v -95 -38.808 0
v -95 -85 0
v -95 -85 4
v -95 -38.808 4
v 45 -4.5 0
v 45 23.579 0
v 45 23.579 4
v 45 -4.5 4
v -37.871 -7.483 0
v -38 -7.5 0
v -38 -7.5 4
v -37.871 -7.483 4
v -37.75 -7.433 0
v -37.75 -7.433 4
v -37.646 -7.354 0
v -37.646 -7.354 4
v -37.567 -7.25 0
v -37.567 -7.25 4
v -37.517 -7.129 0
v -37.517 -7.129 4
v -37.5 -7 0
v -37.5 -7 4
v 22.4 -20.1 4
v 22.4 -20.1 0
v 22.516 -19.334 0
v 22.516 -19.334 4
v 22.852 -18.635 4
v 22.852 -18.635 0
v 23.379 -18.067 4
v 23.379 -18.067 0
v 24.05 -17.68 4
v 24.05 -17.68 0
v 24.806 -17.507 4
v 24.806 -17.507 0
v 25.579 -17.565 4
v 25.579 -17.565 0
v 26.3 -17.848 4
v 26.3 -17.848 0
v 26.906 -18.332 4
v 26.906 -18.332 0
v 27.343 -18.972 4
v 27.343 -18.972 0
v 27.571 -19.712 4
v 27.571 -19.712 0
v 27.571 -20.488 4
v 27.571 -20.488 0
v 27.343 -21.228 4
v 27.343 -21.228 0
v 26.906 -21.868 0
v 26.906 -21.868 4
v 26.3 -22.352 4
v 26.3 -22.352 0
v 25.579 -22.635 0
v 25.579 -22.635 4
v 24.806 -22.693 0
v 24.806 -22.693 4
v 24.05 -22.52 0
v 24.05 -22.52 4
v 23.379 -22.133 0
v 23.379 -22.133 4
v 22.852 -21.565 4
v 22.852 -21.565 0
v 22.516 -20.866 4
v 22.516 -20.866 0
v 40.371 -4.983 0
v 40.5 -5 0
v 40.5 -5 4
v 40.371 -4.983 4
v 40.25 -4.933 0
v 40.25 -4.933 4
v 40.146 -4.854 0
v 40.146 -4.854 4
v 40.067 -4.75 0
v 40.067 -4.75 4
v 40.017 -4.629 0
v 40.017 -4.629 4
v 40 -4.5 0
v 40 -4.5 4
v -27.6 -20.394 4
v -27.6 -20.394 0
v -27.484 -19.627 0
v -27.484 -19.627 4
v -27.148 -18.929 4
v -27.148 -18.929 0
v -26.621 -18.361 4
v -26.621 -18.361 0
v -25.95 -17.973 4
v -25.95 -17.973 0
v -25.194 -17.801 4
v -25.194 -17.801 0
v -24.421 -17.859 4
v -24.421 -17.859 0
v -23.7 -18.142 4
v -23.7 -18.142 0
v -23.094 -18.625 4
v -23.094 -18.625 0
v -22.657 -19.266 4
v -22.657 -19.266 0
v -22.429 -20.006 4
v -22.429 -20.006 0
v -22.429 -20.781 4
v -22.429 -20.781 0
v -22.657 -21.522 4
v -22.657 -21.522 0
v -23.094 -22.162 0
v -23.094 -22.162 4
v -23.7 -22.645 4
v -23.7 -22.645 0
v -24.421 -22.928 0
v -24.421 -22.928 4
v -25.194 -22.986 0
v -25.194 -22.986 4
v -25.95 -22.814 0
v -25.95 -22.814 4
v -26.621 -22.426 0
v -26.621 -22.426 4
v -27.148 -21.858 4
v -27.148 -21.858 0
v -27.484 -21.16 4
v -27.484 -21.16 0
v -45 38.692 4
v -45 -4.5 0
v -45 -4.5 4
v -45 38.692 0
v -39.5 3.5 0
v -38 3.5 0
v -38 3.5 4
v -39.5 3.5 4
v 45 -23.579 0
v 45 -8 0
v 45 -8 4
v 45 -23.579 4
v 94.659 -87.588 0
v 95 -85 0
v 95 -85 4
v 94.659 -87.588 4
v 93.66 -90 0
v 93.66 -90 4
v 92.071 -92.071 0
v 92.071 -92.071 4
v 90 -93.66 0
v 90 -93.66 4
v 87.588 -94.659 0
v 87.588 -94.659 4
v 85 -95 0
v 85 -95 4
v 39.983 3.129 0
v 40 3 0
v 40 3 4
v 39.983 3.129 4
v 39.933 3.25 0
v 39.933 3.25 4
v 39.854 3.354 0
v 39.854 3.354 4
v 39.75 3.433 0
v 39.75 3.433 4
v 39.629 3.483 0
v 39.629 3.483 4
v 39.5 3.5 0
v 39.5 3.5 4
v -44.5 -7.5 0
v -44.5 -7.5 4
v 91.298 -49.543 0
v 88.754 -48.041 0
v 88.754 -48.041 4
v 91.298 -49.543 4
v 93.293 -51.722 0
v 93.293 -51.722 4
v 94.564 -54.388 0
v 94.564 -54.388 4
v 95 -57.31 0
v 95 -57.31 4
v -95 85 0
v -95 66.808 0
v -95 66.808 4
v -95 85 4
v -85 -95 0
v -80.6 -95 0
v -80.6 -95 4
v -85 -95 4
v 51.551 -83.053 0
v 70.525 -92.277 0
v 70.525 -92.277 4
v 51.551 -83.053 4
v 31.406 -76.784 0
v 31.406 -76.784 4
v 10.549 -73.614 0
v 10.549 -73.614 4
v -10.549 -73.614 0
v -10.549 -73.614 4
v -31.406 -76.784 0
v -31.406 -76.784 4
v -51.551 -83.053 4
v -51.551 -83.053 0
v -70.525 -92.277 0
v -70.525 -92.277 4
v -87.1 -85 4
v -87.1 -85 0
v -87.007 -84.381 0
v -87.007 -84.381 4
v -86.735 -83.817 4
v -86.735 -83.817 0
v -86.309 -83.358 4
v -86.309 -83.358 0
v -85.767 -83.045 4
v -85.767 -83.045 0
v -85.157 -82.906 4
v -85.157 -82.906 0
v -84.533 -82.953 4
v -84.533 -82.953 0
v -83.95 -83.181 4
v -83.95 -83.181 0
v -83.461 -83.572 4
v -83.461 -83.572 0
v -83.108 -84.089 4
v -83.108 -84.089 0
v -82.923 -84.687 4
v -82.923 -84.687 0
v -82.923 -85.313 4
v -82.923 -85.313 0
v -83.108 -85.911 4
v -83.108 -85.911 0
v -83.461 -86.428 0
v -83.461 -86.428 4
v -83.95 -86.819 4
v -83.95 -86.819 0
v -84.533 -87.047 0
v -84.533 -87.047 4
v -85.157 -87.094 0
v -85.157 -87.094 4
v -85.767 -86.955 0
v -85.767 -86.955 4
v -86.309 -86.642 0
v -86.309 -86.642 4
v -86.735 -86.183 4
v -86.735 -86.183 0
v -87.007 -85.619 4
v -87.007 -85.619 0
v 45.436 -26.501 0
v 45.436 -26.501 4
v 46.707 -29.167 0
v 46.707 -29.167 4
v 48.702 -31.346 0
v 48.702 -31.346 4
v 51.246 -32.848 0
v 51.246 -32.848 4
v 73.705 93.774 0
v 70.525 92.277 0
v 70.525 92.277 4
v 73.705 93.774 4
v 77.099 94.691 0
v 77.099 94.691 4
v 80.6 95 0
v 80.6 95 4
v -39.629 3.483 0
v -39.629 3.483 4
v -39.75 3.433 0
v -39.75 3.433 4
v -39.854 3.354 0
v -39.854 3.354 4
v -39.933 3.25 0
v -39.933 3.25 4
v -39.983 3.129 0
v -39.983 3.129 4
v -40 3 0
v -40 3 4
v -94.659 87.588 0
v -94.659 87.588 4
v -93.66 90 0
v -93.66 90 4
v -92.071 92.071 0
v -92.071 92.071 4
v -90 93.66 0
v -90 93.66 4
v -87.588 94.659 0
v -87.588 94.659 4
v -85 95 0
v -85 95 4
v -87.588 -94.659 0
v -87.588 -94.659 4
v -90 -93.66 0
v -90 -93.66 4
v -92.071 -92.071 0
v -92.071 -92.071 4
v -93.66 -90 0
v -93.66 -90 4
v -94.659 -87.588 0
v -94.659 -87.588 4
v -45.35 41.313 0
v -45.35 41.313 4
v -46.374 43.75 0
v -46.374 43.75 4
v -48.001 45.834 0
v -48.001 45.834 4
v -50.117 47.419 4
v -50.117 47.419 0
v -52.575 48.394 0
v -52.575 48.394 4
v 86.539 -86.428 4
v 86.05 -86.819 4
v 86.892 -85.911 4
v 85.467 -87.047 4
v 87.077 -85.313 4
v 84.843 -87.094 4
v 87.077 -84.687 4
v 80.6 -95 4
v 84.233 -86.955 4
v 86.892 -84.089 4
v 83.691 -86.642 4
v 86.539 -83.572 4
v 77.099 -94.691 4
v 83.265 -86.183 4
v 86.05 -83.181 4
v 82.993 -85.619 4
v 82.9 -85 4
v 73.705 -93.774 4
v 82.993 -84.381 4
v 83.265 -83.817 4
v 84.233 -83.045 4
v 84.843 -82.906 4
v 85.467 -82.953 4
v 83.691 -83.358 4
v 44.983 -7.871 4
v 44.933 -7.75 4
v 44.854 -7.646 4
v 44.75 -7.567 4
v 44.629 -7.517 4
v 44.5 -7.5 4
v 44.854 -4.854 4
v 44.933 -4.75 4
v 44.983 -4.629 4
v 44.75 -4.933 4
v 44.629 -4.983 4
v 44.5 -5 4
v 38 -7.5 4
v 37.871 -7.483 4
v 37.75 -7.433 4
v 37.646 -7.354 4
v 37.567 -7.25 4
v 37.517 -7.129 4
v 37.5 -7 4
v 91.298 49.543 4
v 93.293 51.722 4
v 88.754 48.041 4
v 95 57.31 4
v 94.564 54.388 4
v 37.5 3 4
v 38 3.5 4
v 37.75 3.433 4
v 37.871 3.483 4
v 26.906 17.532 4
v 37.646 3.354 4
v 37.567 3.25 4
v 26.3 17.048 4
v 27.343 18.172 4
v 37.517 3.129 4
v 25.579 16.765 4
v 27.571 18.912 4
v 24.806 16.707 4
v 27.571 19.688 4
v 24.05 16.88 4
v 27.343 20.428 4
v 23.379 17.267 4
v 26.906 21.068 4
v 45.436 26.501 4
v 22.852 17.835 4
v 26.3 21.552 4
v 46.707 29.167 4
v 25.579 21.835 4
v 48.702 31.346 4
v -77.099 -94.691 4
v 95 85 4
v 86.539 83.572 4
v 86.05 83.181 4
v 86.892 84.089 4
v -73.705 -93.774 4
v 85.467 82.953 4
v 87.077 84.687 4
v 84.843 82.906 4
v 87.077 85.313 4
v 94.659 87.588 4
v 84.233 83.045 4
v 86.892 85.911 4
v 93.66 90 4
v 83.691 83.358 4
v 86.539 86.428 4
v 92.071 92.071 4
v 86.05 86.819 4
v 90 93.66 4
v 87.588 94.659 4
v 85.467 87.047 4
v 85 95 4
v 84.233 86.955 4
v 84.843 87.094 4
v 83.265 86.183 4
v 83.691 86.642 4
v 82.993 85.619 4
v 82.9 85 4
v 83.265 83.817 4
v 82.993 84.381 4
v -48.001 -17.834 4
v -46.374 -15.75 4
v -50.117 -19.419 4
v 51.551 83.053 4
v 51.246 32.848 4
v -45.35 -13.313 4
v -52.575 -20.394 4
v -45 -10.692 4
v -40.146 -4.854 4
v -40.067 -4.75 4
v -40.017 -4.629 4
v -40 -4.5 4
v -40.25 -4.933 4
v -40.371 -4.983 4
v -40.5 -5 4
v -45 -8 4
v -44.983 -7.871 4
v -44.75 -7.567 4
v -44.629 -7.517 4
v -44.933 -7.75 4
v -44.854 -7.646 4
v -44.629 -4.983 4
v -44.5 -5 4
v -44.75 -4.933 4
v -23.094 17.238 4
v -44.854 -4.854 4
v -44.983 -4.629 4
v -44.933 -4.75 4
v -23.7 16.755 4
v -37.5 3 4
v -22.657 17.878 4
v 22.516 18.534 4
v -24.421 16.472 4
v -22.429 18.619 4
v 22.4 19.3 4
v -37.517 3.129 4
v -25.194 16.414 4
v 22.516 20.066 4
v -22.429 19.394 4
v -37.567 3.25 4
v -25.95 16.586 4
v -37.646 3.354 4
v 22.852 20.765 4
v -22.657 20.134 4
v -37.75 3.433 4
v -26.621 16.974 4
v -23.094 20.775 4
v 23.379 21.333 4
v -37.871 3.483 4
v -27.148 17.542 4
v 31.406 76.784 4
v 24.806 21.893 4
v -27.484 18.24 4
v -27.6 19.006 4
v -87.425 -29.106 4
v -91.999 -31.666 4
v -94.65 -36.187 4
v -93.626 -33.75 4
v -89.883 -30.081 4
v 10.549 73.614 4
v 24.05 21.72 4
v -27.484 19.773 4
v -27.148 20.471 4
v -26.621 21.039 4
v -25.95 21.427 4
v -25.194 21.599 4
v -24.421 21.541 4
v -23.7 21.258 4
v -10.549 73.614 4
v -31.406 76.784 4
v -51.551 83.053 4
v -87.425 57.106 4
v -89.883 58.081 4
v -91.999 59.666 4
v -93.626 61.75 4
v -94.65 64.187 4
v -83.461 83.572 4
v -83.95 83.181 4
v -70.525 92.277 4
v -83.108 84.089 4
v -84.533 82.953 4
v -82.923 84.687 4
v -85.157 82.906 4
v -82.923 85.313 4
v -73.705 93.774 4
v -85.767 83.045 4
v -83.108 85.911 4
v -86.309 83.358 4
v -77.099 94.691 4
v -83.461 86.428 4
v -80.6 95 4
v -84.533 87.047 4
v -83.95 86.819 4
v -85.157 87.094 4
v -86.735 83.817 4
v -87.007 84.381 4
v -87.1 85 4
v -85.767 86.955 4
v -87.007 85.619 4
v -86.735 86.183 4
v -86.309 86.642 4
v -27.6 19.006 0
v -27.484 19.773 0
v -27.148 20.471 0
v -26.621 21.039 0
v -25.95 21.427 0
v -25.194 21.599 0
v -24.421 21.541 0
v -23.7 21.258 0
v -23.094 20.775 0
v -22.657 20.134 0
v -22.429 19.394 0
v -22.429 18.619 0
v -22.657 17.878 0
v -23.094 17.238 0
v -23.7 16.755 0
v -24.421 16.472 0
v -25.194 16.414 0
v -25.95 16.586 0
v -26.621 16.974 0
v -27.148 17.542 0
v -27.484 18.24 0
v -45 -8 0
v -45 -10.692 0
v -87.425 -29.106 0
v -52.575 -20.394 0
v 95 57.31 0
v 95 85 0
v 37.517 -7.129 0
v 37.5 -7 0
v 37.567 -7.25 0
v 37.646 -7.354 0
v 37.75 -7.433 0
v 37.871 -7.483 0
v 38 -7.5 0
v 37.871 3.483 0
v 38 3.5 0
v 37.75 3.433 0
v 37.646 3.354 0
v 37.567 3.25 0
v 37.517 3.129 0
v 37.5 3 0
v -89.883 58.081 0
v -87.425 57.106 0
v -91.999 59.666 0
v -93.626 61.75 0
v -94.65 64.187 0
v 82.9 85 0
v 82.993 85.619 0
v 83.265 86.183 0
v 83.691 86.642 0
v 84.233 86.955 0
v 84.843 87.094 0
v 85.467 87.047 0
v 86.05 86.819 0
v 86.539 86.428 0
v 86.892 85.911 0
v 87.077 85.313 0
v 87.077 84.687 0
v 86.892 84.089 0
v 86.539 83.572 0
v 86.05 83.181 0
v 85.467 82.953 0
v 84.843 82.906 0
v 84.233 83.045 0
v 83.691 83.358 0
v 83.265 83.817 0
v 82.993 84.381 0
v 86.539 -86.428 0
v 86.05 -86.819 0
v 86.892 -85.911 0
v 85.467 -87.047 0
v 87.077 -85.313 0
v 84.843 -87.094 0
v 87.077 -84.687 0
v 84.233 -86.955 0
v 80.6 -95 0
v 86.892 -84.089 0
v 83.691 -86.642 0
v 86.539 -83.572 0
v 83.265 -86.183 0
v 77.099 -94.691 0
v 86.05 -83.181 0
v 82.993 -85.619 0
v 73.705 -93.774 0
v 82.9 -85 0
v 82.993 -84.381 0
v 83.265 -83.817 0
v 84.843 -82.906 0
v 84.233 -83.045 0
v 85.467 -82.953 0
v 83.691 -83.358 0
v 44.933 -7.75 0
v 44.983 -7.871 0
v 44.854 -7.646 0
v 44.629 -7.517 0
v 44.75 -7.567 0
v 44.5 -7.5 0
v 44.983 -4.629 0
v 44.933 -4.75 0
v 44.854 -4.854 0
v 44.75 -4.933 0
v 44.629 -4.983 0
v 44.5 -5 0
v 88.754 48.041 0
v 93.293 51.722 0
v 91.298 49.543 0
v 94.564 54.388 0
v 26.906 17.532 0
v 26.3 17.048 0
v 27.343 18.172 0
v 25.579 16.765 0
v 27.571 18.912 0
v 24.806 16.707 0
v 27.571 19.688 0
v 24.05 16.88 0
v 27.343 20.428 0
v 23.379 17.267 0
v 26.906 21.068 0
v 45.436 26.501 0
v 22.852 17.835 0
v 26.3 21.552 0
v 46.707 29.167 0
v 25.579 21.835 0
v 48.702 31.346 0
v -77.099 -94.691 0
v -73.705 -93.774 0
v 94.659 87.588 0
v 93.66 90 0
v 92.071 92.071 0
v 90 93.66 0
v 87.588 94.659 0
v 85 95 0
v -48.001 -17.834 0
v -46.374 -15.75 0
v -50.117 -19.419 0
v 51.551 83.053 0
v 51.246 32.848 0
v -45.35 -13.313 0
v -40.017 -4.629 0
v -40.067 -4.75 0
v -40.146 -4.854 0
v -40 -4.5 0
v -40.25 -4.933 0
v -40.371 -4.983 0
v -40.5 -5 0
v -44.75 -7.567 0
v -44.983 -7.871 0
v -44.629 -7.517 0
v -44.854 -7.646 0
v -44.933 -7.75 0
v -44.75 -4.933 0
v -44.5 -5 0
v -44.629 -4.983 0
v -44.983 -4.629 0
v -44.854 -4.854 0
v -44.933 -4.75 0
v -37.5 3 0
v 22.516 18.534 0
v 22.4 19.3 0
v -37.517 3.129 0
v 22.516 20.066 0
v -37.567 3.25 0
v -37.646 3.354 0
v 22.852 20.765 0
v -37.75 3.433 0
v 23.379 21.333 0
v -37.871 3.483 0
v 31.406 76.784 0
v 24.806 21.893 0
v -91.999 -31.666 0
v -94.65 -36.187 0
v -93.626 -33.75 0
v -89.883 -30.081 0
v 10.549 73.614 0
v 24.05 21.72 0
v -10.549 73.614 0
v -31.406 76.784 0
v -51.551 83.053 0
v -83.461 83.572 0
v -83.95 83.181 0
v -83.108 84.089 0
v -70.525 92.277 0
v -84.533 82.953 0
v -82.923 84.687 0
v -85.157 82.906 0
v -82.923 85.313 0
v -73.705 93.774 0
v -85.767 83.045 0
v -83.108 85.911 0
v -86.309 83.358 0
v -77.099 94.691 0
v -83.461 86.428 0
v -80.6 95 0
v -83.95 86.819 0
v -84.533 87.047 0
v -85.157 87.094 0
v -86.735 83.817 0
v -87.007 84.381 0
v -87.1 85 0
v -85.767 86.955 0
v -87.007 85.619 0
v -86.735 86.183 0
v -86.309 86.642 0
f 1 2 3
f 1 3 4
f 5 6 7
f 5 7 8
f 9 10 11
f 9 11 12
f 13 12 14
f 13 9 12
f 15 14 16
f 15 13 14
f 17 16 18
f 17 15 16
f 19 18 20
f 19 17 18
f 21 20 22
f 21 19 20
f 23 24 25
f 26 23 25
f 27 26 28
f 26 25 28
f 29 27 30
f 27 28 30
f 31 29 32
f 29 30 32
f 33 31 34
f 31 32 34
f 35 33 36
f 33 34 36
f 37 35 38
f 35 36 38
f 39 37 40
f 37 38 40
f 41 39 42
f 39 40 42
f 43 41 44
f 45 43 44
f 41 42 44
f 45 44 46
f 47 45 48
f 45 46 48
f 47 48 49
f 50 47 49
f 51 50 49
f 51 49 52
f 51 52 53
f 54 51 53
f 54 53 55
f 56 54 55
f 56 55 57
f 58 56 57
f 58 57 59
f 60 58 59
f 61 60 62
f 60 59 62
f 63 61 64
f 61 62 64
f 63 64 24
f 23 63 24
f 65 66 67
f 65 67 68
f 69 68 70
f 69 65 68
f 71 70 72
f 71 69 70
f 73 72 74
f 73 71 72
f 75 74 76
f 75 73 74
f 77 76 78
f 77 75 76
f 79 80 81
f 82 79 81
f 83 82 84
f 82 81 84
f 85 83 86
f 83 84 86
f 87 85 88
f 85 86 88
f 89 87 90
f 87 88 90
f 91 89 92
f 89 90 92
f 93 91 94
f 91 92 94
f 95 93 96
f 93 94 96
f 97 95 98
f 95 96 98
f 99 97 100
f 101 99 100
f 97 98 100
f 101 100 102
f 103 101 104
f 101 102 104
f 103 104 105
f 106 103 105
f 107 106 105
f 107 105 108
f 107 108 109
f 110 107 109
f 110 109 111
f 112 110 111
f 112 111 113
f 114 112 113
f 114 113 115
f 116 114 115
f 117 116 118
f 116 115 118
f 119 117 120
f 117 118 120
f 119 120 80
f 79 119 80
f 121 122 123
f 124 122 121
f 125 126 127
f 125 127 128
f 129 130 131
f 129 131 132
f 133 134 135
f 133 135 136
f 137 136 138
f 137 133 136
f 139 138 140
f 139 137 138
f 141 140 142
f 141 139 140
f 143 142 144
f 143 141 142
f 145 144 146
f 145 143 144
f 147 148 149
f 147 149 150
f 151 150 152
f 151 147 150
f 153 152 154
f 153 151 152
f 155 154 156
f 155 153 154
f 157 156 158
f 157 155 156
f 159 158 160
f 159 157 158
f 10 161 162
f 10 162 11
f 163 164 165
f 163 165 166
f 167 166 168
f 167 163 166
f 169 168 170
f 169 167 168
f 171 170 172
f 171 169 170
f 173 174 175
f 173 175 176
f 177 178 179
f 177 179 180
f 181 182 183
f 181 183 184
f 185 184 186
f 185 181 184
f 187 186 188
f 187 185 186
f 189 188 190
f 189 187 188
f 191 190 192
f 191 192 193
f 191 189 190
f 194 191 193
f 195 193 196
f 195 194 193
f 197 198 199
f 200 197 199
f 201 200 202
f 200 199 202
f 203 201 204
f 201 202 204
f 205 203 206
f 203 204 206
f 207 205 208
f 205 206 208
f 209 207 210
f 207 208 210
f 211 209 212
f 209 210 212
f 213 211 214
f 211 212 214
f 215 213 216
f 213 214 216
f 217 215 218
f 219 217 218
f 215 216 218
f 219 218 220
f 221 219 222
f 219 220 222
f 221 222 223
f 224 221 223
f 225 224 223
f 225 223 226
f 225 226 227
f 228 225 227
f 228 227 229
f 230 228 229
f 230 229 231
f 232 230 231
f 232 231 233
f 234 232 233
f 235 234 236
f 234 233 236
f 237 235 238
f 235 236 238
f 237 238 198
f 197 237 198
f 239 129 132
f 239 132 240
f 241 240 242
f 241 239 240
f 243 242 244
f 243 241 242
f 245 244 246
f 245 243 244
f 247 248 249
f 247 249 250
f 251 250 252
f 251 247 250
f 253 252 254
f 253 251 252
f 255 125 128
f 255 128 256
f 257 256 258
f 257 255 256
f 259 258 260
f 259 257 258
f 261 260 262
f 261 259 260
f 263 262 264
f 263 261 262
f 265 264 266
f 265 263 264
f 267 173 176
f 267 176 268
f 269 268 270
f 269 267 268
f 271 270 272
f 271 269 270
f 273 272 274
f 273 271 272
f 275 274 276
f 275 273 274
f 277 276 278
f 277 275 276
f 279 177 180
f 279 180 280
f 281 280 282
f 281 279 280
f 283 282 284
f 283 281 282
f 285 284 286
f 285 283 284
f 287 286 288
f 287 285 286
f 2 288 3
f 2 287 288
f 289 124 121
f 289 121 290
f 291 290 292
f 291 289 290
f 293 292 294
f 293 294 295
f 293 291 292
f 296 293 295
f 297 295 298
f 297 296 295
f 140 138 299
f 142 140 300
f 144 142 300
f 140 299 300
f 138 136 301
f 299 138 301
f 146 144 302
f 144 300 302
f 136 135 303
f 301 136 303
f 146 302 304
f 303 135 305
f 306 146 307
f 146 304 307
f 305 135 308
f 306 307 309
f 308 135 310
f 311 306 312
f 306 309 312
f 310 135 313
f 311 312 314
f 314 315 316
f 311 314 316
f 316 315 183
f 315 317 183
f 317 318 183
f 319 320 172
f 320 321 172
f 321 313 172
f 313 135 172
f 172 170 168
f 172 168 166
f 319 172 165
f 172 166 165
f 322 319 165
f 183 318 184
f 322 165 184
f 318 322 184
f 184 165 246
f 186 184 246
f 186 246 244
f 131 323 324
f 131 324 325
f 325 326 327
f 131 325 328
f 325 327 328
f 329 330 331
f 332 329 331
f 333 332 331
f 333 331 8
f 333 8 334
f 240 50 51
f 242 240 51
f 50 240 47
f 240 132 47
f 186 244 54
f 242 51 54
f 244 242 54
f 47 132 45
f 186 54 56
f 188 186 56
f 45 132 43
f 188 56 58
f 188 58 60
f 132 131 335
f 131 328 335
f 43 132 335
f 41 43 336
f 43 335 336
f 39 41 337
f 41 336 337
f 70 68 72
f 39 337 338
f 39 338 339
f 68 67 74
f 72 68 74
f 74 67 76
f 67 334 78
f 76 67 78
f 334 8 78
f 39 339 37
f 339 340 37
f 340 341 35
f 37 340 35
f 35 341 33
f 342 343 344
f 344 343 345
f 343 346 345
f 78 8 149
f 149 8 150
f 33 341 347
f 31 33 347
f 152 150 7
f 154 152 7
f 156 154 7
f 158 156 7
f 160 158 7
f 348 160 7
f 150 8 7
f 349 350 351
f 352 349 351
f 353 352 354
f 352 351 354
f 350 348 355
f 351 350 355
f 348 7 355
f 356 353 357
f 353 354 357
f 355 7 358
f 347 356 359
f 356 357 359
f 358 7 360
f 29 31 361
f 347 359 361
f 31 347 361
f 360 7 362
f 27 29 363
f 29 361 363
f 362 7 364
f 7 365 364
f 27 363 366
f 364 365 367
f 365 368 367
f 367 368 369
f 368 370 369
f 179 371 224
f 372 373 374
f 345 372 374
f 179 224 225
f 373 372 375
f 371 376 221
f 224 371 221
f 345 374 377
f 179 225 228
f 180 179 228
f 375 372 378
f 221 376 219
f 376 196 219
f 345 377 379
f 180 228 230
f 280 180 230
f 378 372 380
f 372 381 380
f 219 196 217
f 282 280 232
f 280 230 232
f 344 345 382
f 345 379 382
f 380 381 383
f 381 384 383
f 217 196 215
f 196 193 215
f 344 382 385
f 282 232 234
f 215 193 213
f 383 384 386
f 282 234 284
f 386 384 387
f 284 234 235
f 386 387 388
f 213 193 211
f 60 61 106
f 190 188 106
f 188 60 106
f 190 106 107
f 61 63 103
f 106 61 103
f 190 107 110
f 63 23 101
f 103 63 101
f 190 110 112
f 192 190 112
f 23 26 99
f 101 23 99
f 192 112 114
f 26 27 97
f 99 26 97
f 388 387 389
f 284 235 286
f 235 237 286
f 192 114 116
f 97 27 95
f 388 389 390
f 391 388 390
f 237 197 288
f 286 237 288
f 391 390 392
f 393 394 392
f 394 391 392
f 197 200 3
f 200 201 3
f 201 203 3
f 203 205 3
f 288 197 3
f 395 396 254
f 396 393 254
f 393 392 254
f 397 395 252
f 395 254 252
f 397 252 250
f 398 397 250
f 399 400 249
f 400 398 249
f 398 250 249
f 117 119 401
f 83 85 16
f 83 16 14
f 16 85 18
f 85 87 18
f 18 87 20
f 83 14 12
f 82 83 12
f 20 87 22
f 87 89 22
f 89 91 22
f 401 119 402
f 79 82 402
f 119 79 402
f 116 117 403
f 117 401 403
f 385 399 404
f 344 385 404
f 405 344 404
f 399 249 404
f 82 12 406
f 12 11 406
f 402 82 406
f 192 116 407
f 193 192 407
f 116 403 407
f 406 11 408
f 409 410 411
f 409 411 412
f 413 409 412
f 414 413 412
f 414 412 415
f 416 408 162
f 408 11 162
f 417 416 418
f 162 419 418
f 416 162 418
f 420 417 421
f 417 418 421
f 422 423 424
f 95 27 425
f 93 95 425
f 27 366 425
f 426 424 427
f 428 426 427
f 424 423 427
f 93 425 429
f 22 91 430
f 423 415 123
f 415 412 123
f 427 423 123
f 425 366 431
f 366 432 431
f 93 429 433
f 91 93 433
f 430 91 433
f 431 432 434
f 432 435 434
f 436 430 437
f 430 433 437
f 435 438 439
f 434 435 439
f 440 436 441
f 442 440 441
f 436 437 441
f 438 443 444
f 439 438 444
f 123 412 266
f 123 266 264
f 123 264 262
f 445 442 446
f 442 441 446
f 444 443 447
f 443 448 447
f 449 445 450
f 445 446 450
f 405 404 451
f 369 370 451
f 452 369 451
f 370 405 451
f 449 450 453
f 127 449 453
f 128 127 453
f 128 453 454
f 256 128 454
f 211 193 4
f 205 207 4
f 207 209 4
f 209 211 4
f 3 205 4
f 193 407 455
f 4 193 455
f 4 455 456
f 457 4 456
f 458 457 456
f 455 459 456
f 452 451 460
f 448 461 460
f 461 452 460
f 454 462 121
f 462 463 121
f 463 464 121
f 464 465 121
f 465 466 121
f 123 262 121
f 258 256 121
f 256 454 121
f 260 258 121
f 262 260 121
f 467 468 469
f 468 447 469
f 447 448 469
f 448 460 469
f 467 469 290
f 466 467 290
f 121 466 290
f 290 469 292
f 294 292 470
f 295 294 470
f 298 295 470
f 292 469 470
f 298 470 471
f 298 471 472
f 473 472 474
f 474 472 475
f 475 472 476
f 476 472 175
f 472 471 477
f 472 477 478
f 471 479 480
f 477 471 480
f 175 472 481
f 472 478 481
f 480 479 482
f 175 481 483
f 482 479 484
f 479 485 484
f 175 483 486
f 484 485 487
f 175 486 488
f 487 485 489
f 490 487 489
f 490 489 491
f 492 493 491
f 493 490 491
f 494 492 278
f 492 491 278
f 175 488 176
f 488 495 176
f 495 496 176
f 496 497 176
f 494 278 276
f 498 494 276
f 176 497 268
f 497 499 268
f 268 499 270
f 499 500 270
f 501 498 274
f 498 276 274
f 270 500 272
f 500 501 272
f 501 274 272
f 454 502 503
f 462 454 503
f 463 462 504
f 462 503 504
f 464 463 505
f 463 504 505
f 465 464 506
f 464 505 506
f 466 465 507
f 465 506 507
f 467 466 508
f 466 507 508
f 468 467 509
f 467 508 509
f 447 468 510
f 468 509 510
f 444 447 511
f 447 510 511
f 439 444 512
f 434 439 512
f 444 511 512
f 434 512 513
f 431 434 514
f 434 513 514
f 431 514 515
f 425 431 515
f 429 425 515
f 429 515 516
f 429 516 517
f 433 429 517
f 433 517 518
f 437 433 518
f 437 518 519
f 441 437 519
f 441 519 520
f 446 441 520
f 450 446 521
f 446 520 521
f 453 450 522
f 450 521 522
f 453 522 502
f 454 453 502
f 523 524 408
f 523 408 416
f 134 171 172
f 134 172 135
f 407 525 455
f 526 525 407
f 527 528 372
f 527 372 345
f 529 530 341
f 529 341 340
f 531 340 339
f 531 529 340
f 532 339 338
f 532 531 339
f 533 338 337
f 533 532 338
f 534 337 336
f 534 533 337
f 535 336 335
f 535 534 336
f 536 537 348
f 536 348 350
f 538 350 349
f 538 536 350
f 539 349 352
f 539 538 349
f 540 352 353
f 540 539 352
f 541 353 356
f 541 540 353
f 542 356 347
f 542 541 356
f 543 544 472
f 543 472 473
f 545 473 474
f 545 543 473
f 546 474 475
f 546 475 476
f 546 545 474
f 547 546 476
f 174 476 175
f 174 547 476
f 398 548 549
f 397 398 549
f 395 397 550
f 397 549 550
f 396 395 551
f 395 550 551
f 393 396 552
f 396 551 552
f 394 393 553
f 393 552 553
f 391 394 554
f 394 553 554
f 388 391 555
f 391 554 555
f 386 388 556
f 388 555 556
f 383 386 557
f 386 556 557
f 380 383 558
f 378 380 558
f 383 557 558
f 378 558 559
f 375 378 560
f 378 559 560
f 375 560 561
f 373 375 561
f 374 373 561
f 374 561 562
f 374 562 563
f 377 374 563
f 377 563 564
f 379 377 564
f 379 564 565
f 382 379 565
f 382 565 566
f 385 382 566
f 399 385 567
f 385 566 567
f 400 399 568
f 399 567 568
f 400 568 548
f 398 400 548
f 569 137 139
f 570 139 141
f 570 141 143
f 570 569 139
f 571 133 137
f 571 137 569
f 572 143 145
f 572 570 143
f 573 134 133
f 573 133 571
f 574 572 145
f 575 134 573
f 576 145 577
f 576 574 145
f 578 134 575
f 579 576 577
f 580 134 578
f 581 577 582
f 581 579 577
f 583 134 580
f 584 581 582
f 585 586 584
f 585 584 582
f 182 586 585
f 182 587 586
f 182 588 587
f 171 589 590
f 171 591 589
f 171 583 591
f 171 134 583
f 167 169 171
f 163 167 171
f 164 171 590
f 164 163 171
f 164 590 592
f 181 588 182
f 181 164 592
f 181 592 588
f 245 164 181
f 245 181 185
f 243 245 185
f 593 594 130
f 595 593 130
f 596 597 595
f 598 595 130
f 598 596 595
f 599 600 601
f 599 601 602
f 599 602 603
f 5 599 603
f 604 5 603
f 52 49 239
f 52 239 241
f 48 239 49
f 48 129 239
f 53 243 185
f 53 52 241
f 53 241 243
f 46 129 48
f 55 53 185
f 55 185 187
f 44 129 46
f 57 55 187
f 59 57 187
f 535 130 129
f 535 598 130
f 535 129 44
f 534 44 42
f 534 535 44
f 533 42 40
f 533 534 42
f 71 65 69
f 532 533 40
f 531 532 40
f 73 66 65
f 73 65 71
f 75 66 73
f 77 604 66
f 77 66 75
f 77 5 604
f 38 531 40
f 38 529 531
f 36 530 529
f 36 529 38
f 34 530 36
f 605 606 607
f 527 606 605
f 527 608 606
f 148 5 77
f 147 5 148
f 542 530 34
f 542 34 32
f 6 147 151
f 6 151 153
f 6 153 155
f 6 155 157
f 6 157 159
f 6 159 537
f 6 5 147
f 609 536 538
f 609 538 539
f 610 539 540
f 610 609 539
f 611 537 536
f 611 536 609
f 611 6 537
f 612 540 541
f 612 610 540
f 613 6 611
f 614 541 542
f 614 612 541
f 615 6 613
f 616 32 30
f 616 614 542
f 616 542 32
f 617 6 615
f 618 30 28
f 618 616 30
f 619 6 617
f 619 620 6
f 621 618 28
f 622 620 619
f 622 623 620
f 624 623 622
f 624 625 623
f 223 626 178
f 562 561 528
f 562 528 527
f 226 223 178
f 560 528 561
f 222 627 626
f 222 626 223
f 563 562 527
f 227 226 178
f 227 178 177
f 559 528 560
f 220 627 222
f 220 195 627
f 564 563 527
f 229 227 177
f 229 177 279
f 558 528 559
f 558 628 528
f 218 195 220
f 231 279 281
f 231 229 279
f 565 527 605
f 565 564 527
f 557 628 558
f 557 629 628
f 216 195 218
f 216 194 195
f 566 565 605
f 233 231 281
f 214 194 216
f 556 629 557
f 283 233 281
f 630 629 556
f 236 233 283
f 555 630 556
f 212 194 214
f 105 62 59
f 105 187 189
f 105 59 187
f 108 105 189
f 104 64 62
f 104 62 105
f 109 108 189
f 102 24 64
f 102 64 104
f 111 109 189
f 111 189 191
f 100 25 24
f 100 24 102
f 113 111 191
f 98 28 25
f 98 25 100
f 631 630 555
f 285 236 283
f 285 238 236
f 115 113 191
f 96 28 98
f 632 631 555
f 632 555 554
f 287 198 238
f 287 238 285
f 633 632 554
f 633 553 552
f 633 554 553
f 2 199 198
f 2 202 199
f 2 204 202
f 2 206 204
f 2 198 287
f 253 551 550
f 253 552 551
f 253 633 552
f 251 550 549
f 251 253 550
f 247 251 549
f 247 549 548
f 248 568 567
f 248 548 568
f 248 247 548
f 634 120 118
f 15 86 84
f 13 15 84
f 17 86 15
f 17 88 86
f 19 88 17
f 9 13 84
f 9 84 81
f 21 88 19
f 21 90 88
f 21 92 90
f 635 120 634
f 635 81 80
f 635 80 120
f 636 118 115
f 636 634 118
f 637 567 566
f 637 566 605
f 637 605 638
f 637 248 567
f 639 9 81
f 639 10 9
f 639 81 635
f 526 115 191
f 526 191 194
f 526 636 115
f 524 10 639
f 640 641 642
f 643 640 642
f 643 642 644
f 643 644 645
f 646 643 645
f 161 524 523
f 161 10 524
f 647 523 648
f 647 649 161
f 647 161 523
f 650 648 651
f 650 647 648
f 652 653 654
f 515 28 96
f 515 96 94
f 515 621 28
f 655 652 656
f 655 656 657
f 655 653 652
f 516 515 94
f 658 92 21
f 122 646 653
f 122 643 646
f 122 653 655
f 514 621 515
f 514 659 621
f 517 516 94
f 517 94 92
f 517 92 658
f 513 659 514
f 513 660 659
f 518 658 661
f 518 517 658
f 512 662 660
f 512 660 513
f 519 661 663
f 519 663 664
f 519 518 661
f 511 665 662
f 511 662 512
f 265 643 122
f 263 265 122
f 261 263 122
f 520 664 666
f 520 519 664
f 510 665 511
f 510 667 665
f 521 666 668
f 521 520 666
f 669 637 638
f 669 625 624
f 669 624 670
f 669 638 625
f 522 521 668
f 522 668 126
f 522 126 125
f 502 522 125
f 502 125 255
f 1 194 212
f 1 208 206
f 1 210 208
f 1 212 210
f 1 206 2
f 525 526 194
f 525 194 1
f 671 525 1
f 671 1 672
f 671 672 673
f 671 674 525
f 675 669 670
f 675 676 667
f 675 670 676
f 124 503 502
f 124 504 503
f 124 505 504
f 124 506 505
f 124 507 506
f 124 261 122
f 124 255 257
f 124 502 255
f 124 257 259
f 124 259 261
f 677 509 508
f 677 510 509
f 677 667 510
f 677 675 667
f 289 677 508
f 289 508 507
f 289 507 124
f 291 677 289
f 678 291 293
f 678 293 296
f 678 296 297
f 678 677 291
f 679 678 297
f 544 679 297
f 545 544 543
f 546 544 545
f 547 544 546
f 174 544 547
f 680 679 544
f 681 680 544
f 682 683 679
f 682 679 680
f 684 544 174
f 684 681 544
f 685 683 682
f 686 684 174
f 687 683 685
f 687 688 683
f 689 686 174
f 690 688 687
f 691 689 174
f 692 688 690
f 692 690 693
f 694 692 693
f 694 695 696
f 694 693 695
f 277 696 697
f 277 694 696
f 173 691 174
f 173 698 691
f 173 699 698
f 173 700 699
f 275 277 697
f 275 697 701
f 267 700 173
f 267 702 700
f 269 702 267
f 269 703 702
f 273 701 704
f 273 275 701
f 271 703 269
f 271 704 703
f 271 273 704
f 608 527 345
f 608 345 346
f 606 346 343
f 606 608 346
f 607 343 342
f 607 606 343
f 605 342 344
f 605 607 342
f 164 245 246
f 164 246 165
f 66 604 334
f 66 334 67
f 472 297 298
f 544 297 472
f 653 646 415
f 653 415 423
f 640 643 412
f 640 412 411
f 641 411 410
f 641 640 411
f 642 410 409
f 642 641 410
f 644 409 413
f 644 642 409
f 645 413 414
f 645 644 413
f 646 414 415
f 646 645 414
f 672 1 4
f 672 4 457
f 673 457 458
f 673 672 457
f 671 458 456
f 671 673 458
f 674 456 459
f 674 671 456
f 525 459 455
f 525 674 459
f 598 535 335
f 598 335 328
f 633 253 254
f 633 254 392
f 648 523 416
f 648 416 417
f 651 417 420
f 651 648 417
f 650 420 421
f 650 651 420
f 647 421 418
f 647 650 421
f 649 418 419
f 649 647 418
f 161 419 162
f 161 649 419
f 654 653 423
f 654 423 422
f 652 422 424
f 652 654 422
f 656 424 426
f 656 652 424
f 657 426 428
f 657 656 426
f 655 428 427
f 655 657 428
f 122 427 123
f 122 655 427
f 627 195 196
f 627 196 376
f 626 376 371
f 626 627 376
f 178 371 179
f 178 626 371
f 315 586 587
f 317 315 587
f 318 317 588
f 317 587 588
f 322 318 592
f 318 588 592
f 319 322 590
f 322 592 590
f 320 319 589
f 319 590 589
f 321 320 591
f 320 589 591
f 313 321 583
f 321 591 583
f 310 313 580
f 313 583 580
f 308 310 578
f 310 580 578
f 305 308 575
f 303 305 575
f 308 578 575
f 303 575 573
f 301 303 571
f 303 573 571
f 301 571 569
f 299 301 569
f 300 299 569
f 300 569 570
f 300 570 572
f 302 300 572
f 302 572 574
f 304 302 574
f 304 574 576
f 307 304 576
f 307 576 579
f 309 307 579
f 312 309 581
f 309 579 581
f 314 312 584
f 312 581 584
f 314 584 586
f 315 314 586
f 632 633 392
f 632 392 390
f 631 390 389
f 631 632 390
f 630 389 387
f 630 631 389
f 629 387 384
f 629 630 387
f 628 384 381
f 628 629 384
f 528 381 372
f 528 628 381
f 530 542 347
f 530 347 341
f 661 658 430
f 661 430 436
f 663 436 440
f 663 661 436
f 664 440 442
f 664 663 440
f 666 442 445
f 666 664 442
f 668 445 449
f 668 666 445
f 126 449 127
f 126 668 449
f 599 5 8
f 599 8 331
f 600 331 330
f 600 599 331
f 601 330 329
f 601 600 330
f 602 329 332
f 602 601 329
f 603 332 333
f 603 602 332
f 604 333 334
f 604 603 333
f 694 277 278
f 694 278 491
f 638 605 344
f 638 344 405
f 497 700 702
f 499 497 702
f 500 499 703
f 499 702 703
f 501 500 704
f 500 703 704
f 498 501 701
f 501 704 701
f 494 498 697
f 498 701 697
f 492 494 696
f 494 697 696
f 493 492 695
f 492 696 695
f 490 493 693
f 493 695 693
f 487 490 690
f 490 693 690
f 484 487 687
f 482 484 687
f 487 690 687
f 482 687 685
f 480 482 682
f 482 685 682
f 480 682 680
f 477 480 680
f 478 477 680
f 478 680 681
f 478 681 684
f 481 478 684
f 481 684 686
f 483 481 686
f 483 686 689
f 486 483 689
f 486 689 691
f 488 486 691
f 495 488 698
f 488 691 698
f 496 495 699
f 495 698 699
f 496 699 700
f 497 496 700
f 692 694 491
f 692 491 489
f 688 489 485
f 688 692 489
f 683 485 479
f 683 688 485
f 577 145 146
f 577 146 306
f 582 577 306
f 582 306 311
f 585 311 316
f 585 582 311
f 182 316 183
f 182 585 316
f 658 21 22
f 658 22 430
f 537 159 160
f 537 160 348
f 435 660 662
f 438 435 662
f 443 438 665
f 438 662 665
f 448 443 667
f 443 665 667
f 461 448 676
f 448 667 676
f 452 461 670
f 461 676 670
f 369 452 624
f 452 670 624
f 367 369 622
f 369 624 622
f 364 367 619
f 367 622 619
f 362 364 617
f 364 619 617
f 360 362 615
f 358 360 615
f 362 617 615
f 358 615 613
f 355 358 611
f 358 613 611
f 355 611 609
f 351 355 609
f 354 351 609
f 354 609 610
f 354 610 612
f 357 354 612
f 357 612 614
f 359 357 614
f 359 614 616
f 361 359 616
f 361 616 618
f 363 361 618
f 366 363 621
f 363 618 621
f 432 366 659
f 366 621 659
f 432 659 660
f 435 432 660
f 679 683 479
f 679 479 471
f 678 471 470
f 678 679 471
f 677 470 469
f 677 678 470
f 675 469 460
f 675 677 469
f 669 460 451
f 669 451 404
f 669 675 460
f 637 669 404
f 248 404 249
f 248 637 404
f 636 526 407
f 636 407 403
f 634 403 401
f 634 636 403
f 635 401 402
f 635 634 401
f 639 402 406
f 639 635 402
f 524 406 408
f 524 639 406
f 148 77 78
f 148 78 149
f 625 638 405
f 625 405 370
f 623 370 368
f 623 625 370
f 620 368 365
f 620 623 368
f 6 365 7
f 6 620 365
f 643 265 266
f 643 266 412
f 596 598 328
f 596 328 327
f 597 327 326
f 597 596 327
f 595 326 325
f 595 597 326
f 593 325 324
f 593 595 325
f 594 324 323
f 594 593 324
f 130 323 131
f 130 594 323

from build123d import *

# Parameters (mm, degrees)
SKETCH1_R           = 2.1
SKETCH1_R_2         = 2.6
BOSS_EXTRUDE1_DEPTH = 4


with BuildPart() as part:
    # Sketch1 → Boss-Extrude1 (new body)
    with BuildSketch(Plane(origin=(0, 0, 0), x_dir=(-1, 0, 0), z_dir=(0, 0, -1))):
        with BuildLine():
            Line((87.42535625, -29.106339063), (52.57464375, -20.393660937))
            ThreePointArc((52.57464375, -20.393660937), (47.11794562, -16.84635803), (45, -10.692235936))
            Line((45, -10.692235936), (45, -8))
            ThreePointArc((45, -8), (44.853553391, -7.646446609), (44.5, -7.5))
            Line((44.5, -7.5), (38, -7.5))
            ThreePointArc((38, -7.5), (37.646446609, -7.353553391), (37.5, -7))
            Line((37.5, -7), (37.5, 3))
            ThreePointArc((37.5, 3), (37.646446609, 3.353553391), (38, 3.5))
            Line((38, 3.5), (39.5, 3.5))
            ThreePointArc((39.5, 3.5), (39.853553391, 3.353553391), (40, 3))
            Line((40, 3), (40, -4.5))
            ThreePointArc((40, -4.5), (40.146446609, -4.853553391), (40.5, -5))
            Line((40.5, -5), (44.5, -5))
            ThreePointArc((44.5, -5), (44.853553391, -4.853553391), (45, -4.5))
            Line((45, -4.5), (45, 38.692235936))
            ThreePointArc((45, 38.692235936), (47.11794562, 44.84635803), (52.57464375, 48.393660937))
            Line((52.57464375, 48.393660937), (87.42535625, 57.106339063))
            ThreePointArc((87.42535625, 57.106339063), (92.88205438, 60.65364197), (95, 66.807764064))
            Line((95, 66.807764064), (95, 85))
            ThreePointArc((95, 85), (92.071067812, 92.071067812), (85, 95))
            Line((85, 95), (80.600023778, 95))
            ThreePointArc((80.600023778, 95), (75.38177505, 94.307249421), (70.525020806, 92.276988022))
            ThreePointArc((70.525020806, 92.276988022), (0, 73.215904175), (-70.525020806, 92.276988022))
            ThreePointArc((-70.525020806, 92.276988022), (-75.38177505, 94.307249421), (-80.600023778, 95))
            Line((-80.600023778, 95), (-85, 95))
            ThreePointArc((-85, 95), (-92.071067812, 92.071067812), (-95, 85))
            Line((-95, 85), (-95, 57.30993956))
            ThreePointArc((-95, 57.30993956), (-93.292887614, 51.721736358), (-88.754396995, 48.041471336))
            Line((-88.754396995, 48.041471336), (-51.245603005, 32.847708996))
            ThreePointArc((-51.245603005, 32.847708996), (-46.707112386, 29.167443975), (-45, 23.579240773))
            Line((-45, 23.579240773), (-45, -4.5))
            ThreePointArc((-45, -4.5), (-44.853553391, -4.853553391), (-44.5, -5))
            Line((-44.5, -5), (-40.5, -5))
            ThreePointArc((-40.5, -5), (-40.146446609, -4.853553391), (-40, -4.5))
            Line((-40, -4.5), (-40, 3))
            ThreePointArc((-40, 3), (-39.853553391, 3.353553391), (-39.5, 3.5))
            Line((-39.5, 3.5), (-38, 3.5))
            ThreePointArc((-38, 3.5), (-37.646446609, 3.353553391), (-37.5, 3))
            Line((-37.5, 3), (-37.5, -7))
            ThreePointArc((-37.5, -7), (-37.646446609, -7.353553391), (-38, -7.5))
            Line((-38, -7.5), (-44.5, -7.5))
            ThreePointArc((-44.5, -7.5), (-44.853553391, -7.646446609), (-45, -8))
            Line((-45, -8), (-45, -23.579240773))
            ThreePointArc((-45, -23.579240773), (-46.707112386, -29.167443975), (-51.245603005, -32.847708996))
            Line((-51.245603005, -32.847708996), (-88.754396995, -48.041471336))
            ThreePointArc((-88.754396995, -48.041471336), (-93.292887614, -51.721736358), (-95, -57.30993956))
            Line((-95, -57.30993956), (-95, -85))
            ThreePointArc((-95, -85), (-92.071067812, -92.071067812), (-85, -95))
            Line((-85, -95), (-80.600023778, -95))
            ThreePointArc((-80.600023778, -95), (-75.38177505, -94.307249421), (-70.525020806, -92.276988022))
            ThreePointArc((-70.525020806, -92.276988022), (0, -73.215904175), (70.525020806, -92.276988022))
            ThreePointArc((70.525020806, -92.276988022), (75.38177505, -94.307249421), (80.600023778, -95))
            Line((80.600023778, -95), (85, -95))
            ThreePointArc((85, -95), (92.071067812, -92.071067812), (95, -85))
            Line((95, -85), (95, -38.807764064))
            ThreePointArc((95, -38.807764064), (92.88205438, -32.65364197), (87.42535625, -29.106339063))
        make_face()
        with Locations((-85, -85)):
            Circle(SKETCH1_R, mode=Mode.SUBTRACT)
        with Locations((-85, 85)):
            Circle(SKETCH1_R, mode=Mode.SUBTRACT)
        with Locations((85, 85)):
            Circle(SKETCH1_R, mode=Mode.SUBTRACT)
        with Locations((85, -85)):
            Circle(SKETCH1_R, mode=Mode.SUBTRACT)
        with Locations((25, 19.006339063)):
            Circle(SKETCH1_R_2, mode=Mode.SUBTRACT)
        with Locations((25, -20.393660937)):
            Circle(SKETCH1_R_2, mode=Mode.SUBTRACT)
        with Locations((-25, -20.1)):
            Circle(SKETCH1_R_2, mode=Mode.SUBTRACT)
        with Locations((-25, 19.3)):
            Circle(SKETCH1_R_2, mode=Mode.SUBTRACT)
    extrude(amount=-BOSS_EXTRUDE1_DEPTH)


solid = part.part
